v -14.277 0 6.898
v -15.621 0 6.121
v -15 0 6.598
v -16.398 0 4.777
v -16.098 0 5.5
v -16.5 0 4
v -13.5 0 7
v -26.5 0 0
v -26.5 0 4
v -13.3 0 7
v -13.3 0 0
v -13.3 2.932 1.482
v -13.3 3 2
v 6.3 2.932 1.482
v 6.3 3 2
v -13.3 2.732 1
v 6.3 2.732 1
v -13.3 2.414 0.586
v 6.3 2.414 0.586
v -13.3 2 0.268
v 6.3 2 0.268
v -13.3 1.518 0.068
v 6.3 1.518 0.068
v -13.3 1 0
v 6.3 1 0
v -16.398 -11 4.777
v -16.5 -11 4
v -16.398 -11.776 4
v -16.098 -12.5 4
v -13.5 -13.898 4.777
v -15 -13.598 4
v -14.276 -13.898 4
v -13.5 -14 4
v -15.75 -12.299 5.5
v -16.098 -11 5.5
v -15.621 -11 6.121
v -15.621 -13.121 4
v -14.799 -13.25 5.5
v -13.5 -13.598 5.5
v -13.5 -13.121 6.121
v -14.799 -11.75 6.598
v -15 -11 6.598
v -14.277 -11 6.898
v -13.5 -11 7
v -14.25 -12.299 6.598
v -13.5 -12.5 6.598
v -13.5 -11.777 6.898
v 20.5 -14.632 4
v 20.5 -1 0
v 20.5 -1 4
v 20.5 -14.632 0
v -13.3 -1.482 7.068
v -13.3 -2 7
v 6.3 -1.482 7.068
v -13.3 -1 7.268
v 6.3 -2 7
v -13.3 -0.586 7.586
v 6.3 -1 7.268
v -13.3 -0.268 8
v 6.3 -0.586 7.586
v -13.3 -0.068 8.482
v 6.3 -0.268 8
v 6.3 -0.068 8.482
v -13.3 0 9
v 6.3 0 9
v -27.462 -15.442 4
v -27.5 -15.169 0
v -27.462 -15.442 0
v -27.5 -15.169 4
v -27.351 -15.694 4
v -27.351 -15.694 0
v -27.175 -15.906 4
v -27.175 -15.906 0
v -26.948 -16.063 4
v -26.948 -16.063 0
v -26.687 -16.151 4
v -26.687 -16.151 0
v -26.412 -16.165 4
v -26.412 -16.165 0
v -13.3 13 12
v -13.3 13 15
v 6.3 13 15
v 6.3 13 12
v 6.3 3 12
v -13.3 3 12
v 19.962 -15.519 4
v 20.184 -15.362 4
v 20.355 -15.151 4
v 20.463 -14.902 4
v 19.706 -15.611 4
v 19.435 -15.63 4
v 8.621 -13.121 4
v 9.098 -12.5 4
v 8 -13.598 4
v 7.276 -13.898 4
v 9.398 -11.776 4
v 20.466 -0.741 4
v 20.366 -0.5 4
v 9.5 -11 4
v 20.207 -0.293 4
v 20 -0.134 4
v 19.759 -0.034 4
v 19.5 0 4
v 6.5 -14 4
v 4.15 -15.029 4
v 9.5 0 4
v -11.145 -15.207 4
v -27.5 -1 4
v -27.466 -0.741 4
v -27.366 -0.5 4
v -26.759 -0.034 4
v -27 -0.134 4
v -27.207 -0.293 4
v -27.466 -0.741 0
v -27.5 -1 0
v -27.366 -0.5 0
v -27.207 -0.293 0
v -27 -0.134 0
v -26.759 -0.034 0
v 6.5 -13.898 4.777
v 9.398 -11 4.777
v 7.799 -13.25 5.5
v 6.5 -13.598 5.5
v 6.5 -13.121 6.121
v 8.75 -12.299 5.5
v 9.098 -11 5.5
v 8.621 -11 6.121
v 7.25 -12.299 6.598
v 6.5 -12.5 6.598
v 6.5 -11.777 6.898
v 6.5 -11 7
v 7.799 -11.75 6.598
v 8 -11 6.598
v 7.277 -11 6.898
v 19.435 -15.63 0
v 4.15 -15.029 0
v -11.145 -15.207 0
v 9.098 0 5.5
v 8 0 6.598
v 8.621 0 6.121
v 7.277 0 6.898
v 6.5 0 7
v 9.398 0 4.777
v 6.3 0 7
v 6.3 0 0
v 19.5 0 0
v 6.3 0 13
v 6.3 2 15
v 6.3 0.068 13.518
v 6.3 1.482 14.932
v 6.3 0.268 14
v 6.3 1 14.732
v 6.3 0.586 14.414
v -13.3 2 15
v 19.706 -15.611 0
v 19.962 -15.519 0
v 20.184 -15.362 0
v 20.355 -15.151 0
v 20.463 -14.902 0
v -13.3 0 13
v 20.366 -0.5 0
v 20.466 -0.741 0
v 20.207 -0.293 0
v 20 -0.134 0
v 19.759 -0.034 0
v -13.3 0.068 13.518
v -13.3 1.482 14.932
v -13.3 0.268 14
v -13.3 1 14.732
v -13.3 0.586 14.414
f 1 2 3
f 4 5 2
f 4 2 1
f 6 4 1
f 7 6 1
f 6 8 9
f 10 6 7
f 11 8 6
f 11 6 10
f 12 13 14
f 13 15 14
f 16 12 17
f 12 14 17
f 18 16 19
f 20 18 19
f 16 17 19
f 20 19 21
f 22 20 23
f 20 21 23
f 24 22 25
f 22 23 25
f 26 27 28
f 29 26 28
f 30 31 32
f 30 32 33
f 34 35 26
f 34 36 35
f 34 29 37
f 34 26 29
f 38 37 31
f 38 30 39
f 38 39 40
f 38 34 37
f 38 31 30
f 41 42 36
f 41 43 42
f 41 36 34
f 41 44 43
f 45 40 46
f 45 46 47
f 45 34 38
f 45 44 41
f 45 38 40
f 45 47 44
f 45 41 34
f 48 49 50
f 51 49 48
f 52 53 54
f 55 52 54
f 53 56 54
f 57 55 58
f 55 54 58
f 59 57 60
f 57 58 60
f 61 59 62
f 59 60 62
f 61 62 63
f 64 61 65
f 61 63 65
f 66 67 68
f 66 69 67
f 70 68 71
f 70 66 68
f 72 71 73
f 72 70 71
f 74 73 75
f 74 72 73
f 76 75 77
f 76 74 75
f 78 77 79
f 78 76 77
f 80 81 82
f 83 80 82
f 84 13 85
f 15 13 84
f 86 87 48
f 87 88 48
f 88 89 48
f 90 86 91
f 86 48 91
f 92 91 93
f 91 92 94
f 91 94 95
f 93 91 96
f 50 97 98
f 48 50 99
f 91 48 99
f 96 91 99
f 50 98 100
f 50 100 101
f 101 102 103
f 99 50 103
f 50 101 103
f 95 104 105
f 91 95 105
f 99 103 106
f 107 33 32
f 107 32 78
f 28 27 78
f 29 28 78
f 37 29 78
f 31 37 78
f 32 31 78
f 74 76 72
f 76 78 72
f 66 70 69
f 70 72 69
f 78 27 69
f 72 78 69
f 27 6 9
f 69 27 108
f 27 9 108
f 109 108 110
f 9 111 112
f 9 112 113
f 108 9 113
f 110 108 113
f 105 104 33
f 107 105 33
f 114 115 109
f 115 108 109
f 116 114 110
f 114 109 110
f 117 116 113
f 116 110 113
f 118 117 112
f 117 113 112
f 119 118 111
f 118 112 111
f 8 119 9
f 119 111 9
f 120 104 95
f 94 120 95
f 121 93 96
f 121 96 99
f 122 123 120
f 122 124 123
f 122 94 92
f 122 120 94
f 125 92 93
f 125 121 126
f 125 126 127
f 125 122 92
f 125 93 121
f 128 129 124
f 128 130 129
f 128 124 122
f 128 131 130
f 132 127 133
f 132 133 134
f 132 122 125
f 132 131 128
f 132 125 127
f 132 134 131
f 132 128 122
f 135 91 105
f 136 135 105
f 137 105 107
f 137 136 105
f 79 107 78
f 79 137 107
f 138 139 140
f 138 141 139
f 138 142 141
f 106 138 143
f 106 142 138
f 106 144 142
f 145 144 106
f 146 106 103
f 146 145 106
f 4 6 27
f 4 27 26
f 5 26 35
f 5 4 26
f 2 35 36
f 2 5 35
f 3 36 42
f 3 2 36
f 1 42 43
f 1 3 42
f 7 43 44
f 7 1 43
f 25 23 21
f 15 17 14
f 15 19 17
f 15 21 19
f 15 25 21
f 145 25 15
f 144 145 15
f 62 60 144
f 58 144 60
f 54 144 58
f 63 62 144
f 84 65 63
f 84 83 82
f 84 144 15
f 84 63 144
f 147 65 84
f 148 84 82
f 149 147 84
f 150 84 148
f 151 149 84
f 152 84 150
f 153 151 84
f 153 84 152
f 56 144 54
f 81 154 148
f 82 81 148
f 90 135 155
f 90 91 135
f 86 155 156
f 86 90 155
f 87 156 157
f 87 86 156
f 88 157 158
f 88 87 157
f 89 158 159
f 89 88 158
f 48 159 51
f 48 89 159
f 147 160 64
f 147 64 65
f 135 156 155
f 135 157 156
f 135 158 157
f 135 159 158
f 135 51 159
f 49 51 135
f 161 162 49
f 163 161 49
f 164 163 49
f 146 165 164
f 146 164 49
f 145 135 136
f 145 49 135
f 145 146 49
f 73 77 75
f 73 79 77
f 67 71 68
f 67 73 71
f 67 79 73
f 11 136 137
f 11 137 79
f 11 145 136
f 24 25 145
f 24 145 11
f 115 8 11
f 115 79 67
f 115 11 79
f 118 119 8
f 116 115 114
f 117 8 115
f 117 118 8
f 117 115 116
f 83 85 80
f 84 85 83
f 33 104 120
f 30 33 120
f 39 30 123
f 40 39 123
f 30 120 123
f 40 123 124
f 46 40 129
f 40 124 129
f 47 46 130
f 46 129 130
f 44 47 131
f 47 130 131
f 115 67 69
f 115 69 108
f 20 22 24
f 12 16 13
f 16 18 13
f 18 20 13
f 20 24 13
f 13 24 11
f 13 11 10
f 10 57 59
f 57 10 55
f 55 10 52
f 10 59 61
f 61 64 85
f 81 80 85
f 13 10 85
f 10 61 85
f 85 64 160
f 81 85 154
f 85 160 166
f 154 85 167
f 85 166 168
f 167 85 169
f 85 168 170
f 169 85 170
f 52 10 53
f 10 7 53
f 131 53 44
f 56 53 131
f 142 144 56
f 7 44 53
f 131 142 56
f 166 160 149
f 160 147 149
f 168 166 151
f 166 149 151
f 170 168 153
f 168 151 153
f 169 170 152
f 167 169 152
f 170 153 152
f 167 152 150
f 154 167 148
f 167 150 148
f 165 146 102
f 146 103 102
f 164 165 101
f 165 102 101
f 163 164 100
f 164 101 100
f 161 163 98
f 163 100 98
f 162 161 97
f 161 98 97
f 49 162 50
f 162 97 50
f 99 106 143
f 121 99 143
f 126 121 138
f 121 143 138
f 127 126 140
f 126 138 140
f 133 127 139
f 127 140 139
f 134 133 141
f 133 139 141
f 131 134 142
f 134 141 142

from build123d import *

# Parameters (mm, degrees)
BOSS_EXTRUDE1_DEPTH = 4
SKETCH4_W           = 26
SKETCH4_H           = 14
BOSS_EXTRUDE2_DEPTH = 3
FILLET1_R           = 1
FILLET3_R           = 3
FILLET4_R           = 3
SKETCH5_W           = 19.6
SKETCH5_H           = 7
BOSS_EXTRUDE3_DEPTH = 3
SKETCH8_W           = 19.6
SKETCH8_H           = 3
BOSS_EXTRUDE5_DEPTH = 5
SKETCH9_W           = 19.6
SKETCH9_H           = 3
BOSS_EXTRUDE6_DEPTH = 13
FILLET5_R           = 2


# Some blends are built 0.0001 mm under size
with BuildPart() as part:
    # Sketch1 → Boss-Extrude1 (new body)
    with BuildSketch(Plane(origin=(0, 0, 0), x_dir=(-1, 0, 0), z_dir=(0, 0, -1))):
        with BuildLine():
            Line((27.500000074, -16.263075607), (27.500000074, 0))
            Line((27.500000074, 0), (-20.499999926, 0))
            Line((-20.499999926, 0), (-20.499999926, -15.701236215))
            ThreePointArc((-20.499999926, -15.701236215), (3.511255672, -15.020548898), (27.500000074, -16.263075607))
        make_face()
    extrude(amount=-BOSS_EXTRUDE1_DEPTH)

    # Sketch4 → Boss-Extrude2 (add)
    with BuildSketch(Plane.XY.offset(4)):
        with Locations((-3.500000074, -7)):
            Rectangle(SKETCH4_W, SKETCH4_H)
    extrude(amount=BOSS_EXTRUDE2_DEPTH)

    # Fillet1
    fillet1_edges = [part.edges().sort_by_distance(p)[0] for p in [
        (20.499999926, 0, 2),
        (-27.500000074, 0, 2),
        (20.499999926, -15.701236215, 2),
        (-27.500000074, -16.263075607, 2),
    ]]
    fillet(fillet1_edges, radius=FILLET1_R)

    # Fillet3
    fillet3_edges = [part.edges().sort_by_distance(p)[0] for p in [
        (-3.500000074, -14, 7),
        (-16.500000074, -7, 7),
        (9.499999926, -7, 7),
    ]]
    fillet(fillet3_edges, radius=FILLET3_R - 0.0001)  # a hair under: the kernel refuses the full size

    # Fillet4
    # the kernel refuses this fillet: 3 mm, written as the material it takes off along each edge
    with BuildSketch(Plane(origin=(-13.500000074, -11, 7), x_dir=(-1, 0, 0), z_dir=(0, 1, 0))) as fillet4_piece_1:
        with BuildLine():
            CenterArc((0.0001, -2.9999), 2.9999, 0, 90)
            Line((3, -2.9999), (3, 0))
            Line((3, 0), (0.0001, 0))
        make_face()
    revolve(axis=Axis((-13.500000074, -11, 7), (0, 0, 1)), revolution_arc=90, mode=Mode.SUBTRACT)
    with BuildSketch(Plane(origin=(6.499999926, -11, 7), x_dir=(0, -1, 0), z_dir=(-1, 0, 0))) as fillet4_piece_2:
        with BuildLine():
            CenterArc((0.0001, -2.9999), 2.9999, 0, 90)
            Line((3, -2.9999), (3, 0))
            Line((3, 0), (0.0001, 0))
        make_face()
    revolve(axis=Axis((6.499999926, -11, 7), (0, 0, 1)), revolution_arc=90, mode=Mode.SUBTRACT)
    with BuildSketch(Plane(origin=(9.499999926, -14, 4), x_dir=(0, 1, 0), z_dir=(0, 0, 1))) as fillet4_piece_3:
        with BuildLine():
            CenterArc((FILLET4_R, FILLET4_R), FILLET4_R, 180, 90)
            Line((0, FILLET4_R), (0, 0))
            Line((0, 0), (FILLET4_R, 0))
        make_face()
    extrude(amount=3, mode=Mode.SUBTRACT)
    with BuildSketch(Plane(origin=(-16.500000074, -14, 4), x_dir=(0, 1, 0), z_dir=(0, 0, 1))) as fillet4_piece_4:
        with BuildLine():
            CenterArc((FILLET4_R, -FILLET4_R), FILLET4_R, 90, 90)
            Line((0, -FILLET4_R), (0, 0))
            Line((0, 0), (FILLET4_R, 0))
        make_face()
    extrude(amount=3, mode=Mode.SUBTRACT)

    # Sketch5 → Boss-Extrude3 (add)
    with BuildSketch(Plane(origin=(0, 0, 0), x_dir=(1, 0, 0), z_dir=(0, 1, 0))):
        with Locations((-3.500000074, -3.5)):
            Rectangle(SKETCH5_W, SKETCH5_H)
    extrude(amount=BOSS_EXTRUDE3_DEPTH)

    # Sketch8 → Boss-Extrude5 (add)
    with BuildSketch(Plane.XY.offset(7)):
        with Locations((-3.500000074, 1.5)):
            Rectangle(SKETCH8_W, SKETCH8_H)
    extrude(amount=BOSS_EXTRUDE5_DEPTH)

    # Sketch9 → Boss-Extrude6 (add)
    with BuildSketch(Plane.XZ):
        with Locations((-3.500000074, 13.5)):
            Rectangle(SKETCH9_W, SKETCH9_H)
    extrude(amount=-BOSS_EXTRUDE6_DEPTH)

    # Fillet5
    fillet5_edges = [part.edges().sort_by_distance(p)[0] for p in [
        (-3.500000074, 0, 15),
        (-3.500000074, 3, 0),
        (-3.500000074, 0, 7),
    ]]
    fillet(fillet5_edges, radius=FILLET5_R)


solid = part.part
